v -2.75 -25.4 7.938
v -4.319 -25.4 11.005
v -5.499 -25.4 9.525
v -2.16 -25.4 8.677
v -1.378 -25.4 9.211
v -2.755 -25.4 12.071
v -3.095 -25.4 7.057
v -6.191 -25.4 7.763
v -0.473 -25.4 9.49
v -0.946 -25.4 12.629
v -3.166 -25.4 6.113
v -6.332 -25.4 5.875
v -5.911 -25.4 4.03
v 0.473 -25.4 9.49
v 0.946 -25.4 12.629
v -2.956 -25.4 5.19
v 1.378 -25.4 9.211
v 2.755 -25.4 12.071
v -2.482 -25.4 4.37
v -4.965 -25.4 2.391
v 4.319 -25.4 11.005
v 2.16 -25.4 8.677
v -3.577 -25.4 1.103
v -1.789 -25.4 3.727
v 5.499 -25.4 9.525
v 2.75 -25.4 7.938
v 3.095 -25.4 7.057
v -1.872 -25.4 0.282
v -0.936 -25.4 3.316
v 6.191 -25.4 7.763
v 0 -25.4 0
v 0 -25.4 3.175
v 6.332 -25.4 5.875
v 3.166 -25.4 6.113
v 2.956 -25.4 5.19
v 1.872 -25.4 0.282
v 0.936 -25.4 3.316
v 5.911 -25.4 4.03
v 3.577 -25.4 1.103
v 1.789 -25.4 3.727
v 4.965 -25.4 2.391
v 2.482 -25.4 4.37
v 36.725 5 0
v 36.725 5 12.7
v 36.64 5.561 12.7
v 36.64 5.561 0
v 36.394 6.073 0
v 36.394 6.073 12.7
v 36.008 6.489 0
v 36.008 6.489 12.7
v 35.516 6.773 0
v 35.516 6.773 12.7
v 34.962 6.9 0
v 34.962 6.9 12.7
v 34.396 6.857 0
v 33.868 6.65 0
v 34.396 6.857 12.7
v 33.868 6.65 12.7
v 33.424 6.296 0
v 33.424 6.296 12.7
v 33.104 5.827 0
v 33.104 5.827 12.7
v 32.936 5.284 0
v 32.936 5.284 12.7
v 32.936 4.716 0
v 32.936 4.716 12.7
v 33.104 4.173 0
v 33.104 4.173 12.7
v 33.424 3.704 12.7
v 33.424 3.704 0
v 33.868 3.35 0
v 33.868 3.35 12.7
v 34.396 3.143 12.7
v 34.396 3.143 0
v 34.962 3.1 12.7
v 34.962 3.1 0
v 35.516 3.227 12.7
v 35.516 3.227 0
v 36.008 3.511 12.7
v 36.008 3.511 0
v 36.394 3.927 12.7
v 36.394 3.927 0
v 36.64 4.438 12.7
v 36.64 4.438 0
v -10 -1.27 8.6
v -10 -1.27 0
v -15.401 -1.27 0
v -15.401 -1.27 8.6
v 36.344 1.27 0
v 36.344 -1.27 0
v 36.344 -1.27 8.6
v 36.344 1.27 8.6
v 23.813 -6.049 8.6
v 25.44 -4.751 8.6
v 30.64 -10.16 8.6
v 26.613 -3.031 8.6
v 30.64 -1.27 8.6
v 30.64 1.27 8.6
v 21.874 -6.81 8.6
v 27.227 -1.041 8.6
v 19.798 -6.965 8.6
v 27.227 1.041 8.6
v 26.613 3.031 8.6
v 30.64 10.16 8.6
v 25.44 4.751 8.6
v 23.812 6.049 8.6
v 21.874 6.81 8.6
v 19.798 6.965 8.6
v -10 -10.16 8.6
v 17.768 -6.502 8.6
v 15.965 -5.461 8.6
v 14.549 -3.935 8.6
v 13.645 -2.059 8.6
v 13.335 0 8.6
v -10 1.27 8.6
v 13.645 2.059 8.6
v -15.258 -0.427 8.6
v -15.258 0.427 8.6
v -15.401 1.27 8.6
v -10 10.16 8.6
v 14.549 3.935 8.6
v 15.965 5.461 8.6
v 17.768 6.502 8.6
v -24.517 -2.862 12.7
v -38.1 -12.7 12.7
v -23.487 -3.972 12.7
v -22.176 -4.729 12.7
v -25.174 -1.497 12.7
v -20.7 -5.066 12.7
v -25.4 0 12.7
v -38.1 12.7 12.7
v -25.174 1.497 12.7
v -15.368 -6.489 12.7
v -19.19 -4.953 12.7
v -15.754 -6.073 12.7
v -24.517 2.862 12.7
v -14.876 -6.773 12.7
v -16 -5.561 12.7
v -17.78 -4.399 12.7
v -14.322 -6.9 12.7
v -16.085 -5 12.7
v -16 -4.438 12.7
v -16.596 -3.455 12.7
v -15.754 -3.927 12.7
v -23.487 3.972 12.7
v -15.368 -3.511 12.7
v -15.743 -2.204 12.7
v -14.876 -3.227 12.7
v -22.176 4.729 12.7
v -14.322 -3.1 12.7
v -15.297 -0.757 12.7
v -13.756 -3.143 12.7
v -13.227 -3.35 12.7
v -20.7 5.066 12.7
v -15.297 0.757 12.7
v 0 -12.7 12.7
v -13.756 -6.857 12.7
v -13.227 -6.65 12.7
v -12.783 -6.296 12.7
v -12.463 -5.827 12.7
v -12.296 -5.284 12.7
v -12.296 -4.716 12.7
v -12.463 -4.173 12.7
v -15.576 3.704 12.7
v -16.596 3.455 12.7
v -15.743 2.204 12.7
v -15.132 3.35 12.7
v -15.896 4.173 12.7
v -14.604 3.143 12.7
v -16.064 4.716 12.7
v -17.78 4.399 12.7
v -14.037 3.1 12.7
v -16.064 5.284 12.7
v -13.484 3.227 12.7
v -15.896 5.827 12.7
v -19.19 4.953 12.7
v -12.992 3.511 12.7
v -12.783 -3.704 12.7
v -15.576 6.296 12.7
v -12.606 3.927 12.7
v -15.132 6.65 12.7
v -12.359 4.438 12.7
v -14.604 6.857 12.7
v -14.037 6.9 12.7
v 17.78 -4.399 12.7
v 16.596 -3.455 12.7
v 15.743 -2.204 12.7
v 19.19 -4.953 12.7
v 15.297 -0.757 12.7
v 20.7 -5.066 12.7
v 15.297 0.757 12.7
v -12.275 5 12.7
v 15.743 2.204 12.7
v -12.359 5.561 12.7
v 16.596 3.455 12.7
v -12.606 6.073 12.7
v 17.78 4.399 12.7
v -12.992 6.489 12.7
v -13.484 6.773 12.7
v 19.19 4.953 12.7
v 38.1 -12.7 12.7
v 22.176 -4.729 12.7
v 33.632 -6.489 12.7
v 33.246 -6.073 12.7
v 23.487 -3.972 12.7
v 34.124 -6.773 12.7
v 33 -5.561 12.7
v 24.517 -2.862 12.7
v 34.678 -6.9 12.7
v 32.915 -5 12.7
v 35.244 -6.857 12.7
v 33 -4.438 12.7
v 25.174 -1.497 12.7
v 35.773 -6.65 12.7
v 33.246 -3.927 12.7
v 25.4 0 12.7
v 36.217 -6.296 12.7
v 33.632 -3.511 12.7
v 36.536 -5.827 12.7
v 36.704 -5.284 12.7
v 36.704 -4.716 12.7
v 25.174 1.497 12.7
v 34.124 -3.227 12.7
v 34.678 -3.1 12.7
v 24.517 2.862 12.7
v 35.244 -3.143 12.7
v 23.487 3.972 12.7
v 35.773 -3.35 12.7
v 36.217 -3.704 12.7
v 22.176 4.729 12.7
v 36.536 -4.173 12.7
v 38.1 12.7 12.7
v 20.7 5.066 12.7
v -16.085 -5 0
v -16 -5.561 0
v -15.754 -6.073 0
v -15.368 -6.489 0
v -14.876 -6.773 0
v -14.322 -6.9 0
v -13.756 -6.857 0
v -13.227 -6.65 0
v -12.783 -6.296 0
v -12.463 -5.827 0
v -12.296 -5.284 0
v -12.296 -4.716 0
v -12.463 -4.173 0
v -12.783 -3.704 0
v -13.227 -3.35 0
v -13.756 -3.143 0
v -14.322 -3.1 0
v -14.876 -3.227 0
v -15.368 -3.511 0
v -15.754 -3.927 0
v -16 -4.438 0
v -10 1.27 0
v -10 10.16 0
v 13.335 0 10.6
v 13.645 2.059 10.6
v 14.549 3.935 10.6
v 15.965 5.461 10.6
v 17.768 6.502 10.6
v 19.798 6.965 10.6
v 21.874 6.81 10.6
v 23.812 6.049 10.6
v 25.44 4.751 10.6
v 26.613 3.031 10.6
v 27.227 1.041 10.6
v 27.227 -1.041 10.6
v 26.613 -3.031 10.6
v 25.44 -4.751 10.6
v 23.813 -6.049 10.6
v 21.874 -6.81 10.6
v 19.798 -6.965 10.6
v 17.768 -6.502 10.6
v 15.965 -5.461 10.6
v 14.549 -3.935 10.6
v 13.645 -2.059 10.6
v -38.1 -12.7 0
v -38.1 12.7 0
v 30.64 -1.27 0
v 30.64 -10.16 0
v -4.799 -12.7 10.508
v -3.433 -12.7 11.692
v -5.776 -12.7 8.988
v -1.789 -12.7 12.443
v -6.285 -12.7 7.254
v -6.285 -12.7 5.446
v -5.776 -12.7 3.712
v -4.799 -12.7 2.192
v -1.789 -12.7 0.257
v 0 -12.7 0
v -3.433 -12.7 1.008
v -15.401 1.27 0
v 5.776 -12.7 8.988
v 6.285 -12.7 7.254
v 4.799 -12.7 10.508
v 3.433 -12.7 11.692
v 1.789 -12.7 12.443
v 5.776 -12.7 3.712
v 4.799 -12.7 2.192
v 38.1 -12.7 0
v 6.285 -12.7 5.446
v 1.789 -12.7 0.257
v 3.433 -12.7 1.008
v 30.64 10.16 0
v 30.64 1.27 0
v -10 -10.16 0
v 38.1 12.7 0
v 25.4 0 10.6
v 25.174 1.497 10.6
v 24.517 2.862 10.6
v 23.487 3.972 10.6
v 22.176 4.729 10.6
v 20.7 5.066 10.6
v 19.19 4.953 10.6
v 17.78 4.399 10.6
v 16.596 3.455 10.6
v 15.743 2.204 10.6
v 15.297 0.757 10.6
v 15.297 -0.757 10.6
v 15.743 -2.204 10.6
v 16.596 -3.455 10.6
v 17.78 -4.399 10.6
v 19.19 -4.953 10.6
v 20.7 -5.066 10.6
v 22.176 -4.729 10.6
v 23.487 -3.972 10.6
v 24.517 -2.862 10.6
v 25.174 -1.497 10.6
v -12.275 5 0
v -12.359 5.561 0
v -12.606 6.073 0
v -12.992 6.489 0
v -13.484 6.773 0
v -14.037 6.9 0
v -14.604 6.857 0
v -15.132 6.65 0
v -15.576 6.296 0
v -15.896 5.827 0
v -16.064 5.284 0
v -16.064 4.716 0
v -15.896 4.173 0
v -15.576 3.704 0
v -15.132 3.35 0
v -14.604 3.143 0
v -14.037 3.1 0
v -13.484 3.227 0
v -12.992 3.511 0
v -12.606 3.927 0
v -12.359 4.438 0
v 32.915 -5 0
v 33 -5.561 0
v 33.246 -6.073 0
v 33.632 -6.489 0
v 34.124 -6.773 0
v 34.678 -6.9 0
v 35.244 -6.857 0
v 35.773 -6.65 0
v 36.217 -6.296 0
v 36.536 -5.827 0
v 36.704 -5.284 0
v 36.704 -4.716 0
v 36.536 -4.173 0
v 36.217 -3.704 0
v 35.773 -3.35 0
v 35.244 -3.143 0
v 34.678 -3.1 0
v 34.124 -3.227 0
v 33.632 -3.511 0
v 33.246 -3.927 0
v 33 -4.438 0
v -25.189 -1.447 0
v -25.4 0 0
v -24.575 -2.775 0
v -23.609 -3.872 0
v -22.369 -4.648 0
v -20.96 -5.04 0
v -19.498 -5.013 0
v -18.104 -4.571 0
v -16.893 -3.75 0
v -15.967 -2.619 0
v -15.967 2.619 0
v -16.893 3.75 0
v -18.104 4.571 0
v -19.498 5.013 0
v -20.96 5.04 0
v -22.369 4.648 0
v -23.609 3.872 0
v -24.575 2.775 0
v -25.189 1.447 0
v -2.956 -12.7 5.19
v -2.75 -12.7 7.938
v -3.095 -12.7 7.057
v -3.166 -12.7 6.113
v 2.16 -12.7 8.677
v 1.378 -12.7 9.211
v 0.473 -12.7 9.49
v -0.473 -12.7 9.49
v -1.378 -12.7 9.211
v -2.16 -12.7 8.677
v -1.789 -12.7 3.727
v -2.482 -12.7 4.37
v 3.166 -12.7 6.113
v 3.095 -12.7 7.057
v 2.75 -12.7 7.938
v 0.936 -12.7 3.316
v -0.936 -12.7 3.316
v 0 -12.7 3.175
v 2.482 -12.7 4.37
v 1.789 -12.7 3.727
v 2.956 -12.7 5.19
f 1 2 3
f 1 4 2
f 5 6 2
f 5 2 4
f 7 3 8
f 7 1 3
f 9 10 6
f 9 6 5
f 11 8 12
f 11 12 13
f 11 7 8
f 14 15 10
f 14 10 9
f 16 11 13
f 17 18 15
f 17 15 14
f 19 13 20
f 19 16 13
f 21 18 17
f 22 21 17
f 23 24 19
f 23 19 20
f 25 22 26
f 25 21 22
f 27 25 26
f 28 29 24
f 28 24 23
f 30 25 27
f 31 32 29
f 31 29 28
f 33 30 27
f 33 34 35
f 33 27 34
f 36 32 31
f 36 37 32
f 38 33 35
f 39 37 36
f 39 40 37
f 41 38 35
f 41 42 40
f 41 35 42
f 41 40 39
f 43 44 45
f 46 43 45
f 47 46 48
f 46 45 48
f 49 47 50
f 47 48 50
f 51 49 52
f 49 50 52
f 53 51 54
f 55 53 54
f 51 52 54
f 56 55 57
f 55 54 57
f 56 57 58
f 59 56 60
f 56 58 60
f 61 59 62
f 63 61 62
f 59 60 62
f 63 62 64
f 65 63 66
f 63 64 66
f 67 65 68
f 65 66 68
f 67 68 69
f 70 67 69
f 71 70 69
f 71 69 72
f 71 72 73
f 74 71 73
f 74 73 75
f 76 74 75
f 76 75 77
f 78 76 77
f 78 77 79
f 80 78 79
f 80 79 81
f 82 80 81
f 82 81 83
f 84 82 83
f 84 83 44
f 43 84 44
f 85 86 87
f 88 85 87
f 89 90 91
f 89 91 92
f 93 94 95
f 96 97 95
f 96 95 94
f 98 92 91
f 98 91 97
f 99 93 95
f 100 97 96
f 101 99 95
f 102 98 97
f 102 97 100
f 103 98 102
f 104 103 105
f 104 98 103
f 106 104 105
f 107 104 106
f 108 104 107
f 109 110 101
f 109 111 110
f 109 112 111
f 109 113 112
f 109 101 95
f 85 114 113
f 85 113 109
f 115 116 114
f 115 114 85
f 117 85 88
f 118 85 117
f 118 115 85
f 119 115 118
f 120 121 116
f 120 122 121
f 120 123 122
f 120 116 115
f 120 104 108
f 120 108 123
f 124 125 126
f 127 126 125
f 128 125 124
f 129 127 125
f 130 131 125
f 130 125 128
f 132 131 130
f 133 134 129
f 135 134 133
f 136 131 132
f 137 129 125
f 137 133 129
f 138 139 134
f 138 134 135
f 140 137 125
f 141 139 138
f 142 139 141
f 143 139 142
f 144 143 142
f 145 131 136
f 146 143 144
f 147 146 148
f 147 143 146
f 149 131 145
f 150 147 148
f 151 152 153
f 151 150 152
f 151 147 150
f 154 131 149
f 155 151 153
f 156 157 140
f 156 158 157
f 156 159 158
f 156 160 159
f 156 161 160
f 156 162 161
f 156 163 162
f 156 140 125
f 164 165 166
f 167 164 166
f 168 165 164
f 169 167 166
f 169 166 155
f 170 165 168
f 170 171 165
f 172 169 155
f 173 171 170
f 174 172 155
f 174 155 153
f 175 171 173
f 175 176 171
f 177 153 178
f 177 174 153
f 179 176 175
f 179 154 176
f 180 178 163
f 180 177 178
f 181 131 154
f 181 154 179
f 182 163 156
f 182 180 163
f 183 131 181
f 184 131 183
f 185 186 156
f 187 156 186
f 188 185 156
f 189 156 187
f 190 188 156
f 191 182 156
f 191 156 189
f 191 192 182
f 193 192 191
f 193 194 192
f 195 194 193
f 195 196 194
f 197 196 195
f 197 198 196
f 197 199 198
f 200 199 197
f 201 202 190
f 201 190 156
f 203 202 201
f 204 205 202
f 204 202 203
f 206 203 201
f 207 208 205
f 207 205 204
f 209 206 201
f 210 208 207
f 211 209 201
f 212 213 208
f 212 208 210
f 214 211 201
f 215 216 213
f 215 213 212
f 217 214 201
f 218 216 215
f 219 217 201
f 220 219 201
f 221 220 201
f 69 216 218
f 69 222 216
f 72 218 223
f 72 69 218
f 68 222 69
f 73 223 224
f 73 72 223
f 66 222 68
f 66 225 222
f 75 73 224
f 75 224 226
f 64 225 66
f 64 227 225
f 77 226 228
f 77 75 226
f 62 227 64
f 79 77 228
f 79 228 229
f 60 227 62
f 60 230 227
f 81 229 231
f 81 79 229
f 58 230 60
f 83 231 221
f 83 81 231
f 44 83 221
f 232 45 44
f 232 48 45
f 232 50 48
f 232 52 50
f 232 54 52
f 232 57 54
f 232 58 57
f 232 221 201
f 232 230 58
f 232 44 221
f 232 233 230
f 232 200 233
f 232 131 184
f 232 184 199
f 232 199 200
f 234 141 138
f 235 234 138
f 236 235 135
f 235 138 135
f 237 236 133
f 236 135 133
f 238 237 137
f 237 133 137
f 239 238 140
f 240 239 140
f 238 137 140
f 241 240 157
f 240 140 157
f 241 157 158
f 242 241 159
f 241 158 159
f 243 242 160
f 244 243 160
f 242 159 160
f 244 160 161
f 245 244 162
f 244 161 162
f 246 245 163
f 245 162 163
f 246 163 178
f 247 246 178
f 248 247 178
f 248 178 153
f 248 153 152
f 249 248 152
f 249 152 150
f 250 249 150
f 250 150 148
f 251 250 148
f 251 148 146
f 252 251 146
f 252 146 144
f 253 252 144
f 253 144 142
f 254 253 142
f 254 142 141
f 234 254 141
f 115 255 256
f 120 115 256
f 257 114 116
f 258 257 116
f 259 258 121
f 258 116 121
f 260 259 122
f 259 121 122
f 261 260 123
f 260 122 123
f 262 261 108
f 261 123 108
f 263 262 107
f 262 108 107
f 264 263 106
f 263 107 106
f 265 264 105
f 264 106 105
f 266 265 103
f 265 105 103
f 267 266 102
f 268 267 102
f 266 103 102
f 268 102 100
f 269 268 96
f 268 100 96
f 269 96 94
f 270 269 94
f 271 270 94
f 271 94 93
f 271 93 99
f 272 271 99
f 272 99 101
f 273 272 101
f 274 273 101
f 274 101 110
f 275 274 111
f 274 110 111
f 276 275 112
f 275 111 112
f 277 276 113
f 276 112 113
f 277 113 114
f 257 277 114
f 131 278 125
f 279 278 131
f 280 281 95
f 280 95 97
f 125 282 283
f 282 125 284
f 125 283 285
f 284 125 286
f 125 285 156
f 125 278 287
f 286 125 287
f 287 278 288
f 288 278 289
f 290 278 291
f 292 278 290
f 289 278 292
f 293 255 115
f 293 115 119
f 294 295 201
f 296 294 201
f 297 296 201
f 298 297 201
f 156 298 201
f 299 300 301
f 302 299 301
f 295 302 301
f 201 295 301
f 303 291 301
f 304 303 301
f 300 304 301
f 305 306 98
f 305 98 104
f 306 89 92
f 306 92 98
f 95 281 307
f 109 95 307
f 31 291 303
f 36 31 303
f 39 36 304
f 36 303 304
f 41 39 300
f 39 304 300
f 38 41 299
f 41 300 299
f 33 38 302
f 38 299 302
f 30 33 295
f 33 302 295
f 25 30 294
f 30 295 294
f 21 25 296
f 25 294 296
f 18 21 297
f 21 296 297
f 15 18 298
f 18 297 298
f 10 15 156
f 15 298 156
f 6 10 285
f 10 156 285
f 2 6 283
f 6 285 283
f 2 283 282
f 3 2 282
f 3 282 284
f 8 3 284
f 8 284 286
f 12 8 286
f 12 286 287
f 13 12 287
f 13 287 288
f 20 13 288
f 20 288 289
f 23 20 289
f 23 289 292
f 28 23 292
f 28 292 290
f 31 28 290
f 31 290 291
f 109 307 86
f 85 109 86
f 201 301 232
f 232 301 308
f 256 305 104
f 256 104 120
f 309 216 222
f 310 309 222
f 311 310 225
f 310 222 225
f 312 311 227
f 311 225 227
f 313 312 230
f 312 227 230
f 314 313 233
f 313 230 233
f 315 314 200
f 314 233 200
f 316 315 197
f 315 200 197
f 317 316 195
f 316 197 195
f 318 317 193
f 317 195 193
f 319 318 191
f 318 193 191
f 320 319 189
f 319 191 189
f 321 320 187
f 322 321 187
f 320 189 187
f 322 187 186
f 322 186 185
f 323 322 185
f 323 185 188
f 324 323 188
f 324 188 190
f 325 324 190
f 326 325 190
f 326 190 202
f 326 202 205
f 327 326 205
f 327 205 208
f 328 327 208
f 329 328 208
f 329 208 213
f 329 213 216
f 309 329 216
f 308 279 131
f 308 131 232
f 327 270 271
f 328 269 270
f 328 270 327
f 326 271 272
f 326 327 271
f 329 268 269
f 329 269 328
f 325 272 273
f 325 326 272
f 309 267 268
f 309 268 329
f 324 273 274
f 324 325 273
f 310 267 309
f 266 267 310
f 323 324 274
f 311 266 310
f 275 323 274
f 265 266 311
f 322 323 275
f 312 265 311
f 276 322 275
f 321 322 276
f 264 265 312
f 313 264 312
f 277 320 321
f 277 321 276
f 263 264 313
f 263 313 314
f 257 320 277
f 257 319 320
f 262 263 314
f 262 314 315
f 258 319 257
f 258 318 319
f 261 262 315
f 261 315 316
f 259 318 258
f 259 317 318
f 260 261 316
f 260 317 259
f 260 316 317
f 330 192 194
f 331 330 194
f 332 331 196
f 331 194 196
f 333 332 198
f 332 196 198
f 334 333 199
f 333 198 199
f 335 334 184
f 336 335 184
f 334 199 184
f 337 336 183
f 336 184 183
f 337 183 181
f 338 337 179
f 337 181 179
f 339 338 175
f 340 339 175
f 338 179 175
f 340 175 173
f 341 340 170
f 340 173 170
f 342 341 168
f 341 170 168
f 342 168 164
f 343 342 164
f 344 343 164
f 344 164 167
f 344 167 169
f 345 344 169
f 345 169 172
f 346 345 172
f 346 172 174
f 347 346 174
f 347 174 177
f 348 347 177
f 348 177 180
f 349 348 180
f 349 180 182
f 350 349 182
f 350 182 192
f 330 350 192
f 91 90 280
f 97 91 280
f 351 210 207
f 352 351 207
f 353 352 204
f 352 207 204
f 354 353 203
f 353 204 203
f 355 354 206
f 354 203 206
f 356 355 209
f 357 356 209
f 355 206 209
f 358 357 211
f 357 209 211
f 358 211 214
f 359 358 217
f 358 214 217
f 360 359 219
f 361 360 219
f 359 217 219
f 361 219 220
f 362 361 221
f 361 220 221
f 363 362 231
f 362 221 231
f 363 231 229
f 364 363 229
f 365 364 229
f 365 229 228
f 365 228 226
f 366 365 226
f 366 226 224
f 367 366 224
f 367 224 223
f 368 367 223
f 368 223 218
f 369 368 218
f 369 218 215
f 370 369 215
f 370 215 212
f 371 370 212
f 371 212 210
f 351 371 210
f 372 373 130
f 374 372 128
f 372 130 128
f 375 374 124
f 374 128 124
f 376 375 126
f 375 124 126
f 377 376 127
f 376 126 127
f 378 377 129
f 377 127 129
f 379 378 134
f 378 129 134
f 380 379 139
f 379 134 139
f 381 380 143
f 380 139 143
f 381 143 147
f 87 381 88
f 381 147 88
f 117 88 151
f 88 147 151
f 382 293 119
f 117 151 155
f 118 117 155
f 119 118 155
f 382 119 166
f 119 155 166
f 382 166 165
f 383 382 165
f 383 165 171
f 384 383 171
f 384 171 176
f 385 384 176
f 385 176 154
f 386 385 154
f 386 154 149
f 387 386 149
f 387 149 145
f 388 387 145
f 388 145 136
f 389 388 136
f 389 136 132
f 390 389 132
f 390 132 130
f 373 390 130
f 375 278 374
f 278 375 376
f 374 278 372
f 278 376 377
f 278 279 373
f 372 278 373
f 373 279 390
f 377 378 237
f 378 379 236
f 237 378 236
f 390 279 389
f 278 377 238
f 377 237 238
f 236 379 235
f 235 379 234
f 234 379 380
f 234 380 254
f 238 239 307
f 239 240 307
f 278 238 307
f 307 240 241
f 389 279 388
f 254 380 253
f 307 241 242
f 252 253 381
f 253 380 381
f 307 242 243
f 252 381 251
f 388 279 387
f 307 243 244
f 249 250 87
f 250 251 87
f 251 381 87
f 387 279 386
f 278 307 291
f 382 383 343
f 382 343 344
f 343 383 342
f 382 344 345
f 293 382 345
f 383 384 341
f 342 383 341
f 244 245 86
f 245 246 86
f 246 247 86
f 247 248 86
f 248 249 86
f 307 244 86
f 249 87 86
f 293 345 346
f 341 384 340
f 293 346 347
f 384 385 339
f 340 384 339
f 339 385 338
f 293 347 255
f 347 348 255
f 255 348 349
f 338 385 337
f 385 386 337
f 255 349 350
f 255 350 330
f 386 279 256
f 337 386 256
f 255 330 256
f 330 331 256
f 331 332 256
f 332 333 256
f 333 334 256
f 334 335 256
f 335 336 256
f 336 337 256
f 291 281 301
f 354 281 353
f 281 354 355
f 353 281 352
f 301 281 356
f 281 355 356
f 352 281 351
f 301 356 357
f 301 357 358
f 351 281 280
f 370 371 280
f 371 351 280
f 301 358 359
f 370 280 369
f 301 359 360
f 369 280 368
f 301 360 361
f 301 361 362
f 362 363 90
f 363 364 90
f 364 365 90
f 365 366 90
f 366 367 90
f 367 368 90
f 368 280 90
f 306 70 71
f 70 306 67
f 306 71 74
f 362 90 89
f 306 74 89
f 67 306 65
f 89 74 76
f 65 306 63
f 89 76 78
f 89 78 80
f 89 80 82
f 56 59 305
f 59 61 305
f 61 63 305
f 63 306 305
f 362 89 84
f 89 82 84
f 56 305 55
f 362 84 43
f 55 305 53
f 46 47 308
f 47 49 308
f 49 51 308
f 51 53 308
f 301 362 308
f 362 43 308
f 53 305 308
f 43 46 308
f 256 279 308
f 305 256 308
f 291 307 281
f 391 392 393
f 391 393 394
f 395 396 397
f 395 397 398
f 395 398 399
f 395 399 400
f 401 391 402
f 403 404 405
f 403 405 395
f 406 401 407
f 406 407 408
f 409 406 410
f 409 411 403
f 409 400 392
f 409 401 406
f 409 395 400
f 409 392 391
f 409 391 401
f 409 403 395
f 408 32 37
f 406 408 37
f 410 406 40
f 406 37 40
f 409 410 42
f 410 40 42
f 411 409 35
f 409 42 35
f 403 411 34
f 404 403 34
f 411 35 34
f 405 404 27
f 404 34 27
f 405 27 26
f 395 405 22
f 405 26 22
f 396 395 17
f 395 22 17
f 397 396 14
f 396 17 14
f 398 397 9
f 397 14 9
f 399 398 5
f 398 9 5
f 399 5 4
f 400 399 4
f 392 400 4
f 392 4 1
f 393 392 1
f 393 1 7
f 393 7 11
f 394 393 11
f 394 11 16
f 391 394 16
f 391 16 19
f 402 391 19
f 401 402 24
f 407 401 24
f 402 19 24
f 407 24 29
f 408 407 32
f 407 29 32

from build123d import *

# Parameters (mm, degrees)
SKETCH1_W           = 76.2
SKETCH1_H           = 25.4
BOSS_EXTRUDE1_DEPTH = 12.7
SKETCH2_R           = 5.08
CUT_EXTRUDE1_DEPTH  = 43.121134838
SKETCH3_R           = 1.905
CUT_EXTRUDE2_DEPTH  = 43.121134838
SKETCH4_W           = 40.64
SKETCH4_H           = 20.32
SKETCH4_W_2         = 5.703951
SKETCH4_H_2         = 2.54
CUT_EXTRUDE3_DEPTH  = 8.599932
SKETCH5_R           = 6.985
CUT_EXTRUDE4_DEPTH  = 1.999996
SKETCH9_R           = 6.35
BOSS_EXTRUDE3_DEPTH = 12.7
SKETCH7_R           = 3.175
CUT_EXTRUDE5_DEPTH  = 12.7


with BuildPart() as part:
    # Sketch1 → Boss-Extrude1 (new body)
    with BuildSketch(Plane.XY):
        Rectangle(SKETCH1_W, SKETCH1_H)
    extrude(amount=BOSS_EXTRUDE1_DEPTH)

    # Sketch2 → Cut-Extrude1 (cut, through all)
    with BuildSketch(Plane.XY.offset(12.7)):
        with Locations((20.32, 0)):
            Circle(SKETCH2_R)
        with Locations(Location((-20.32, 0, 0), (0, 0, 180))):
            Circle(SKETCH2_R)
    extrude(amount=-CUT_EXTRUDE1_DEPTH, mode=Mode.SUBTRACT)

    # Sketch3 → Cut-Extrude2 (cut, through all)
    with BuildSketch(Plane.XY.offset(12.7)):
        with Locations((34.820098, 4.99999)):
            Circle(SKETCH3_R)
        with Locations((-14.179804, 4.99999)):
            Circle(SKETCH3_R)
        with Locations(Location((34.820098, -4.99999, 0), (0, 0, 180))):
            Circle(SKETCH3_R)
        with Locations(Location((-14.179804, -4.99999, 0), (0, 0, 180))):
            Circle(SKETCH3_R)
    extrude(amount=-CUT_EXTRUDE2_DEPTH, mode=Mode.SUBTRACT)

    # Sketch4 → Cut-Extrude3 (cut)
    with BuildSketch(Plane(origin=(0, 0, 0), x_dir=(-1, 0, 0), z_dir=(0, 0, -1))):
        with Locations((-10.320147, 0)):
            Rectangle(SKETCH4_W, SKETCH4_H)
        with Locations((-33.4921225, 0)):
            Rectangle(SKETCH4_W_2, SKETCH4_H_2)
        with Locations((12.8518285, 0)):
            Rectangle(SKETCH4_W_2, SKETCH4_H_2)
    extrude(amount=-CUT_EXTRUDE3_DEPTH, mode=Mode.SUBTRACT)

    # Sketch5 → Cut-Extrude4 (cut)
    with BuildSketch(Plane(origin=(0, 0, 8.599932), x_dir=(-1, 0, 0), z_dir=(0, 0, -1))):
        with Locations((-20.32, 0)):
            Circle(SKETCH5_R)
    extrude(amount=-CUT_EXTRUDE4_DEPTH, mode=Mode.SUBTRACT)

    # Sketch9 → Boss-Extrude3 (add)
    with BuildSketch(Plane.XZ.offset(12.7)):
        with Locations(Location((0, 6.35, 0), (0, 0, 270))):
            Circle(SKETCH9_R)
    extrude(amount=BOSS_EXTRUDE3_DEPTH)

    # Sketch7 → Cut-Extrude5 (cut)
    with BuildSketch(Plane.XZ.offset(25.4)):
        with Locations(Location((0, 6.35, 0), (0, 0, 270))):
            Circle(SKETCH7_R)
    extrude(amount=-CUT_EXTRUDE5_DEPTH, mode=Mode.SUBTRACT)


solid = part.part
